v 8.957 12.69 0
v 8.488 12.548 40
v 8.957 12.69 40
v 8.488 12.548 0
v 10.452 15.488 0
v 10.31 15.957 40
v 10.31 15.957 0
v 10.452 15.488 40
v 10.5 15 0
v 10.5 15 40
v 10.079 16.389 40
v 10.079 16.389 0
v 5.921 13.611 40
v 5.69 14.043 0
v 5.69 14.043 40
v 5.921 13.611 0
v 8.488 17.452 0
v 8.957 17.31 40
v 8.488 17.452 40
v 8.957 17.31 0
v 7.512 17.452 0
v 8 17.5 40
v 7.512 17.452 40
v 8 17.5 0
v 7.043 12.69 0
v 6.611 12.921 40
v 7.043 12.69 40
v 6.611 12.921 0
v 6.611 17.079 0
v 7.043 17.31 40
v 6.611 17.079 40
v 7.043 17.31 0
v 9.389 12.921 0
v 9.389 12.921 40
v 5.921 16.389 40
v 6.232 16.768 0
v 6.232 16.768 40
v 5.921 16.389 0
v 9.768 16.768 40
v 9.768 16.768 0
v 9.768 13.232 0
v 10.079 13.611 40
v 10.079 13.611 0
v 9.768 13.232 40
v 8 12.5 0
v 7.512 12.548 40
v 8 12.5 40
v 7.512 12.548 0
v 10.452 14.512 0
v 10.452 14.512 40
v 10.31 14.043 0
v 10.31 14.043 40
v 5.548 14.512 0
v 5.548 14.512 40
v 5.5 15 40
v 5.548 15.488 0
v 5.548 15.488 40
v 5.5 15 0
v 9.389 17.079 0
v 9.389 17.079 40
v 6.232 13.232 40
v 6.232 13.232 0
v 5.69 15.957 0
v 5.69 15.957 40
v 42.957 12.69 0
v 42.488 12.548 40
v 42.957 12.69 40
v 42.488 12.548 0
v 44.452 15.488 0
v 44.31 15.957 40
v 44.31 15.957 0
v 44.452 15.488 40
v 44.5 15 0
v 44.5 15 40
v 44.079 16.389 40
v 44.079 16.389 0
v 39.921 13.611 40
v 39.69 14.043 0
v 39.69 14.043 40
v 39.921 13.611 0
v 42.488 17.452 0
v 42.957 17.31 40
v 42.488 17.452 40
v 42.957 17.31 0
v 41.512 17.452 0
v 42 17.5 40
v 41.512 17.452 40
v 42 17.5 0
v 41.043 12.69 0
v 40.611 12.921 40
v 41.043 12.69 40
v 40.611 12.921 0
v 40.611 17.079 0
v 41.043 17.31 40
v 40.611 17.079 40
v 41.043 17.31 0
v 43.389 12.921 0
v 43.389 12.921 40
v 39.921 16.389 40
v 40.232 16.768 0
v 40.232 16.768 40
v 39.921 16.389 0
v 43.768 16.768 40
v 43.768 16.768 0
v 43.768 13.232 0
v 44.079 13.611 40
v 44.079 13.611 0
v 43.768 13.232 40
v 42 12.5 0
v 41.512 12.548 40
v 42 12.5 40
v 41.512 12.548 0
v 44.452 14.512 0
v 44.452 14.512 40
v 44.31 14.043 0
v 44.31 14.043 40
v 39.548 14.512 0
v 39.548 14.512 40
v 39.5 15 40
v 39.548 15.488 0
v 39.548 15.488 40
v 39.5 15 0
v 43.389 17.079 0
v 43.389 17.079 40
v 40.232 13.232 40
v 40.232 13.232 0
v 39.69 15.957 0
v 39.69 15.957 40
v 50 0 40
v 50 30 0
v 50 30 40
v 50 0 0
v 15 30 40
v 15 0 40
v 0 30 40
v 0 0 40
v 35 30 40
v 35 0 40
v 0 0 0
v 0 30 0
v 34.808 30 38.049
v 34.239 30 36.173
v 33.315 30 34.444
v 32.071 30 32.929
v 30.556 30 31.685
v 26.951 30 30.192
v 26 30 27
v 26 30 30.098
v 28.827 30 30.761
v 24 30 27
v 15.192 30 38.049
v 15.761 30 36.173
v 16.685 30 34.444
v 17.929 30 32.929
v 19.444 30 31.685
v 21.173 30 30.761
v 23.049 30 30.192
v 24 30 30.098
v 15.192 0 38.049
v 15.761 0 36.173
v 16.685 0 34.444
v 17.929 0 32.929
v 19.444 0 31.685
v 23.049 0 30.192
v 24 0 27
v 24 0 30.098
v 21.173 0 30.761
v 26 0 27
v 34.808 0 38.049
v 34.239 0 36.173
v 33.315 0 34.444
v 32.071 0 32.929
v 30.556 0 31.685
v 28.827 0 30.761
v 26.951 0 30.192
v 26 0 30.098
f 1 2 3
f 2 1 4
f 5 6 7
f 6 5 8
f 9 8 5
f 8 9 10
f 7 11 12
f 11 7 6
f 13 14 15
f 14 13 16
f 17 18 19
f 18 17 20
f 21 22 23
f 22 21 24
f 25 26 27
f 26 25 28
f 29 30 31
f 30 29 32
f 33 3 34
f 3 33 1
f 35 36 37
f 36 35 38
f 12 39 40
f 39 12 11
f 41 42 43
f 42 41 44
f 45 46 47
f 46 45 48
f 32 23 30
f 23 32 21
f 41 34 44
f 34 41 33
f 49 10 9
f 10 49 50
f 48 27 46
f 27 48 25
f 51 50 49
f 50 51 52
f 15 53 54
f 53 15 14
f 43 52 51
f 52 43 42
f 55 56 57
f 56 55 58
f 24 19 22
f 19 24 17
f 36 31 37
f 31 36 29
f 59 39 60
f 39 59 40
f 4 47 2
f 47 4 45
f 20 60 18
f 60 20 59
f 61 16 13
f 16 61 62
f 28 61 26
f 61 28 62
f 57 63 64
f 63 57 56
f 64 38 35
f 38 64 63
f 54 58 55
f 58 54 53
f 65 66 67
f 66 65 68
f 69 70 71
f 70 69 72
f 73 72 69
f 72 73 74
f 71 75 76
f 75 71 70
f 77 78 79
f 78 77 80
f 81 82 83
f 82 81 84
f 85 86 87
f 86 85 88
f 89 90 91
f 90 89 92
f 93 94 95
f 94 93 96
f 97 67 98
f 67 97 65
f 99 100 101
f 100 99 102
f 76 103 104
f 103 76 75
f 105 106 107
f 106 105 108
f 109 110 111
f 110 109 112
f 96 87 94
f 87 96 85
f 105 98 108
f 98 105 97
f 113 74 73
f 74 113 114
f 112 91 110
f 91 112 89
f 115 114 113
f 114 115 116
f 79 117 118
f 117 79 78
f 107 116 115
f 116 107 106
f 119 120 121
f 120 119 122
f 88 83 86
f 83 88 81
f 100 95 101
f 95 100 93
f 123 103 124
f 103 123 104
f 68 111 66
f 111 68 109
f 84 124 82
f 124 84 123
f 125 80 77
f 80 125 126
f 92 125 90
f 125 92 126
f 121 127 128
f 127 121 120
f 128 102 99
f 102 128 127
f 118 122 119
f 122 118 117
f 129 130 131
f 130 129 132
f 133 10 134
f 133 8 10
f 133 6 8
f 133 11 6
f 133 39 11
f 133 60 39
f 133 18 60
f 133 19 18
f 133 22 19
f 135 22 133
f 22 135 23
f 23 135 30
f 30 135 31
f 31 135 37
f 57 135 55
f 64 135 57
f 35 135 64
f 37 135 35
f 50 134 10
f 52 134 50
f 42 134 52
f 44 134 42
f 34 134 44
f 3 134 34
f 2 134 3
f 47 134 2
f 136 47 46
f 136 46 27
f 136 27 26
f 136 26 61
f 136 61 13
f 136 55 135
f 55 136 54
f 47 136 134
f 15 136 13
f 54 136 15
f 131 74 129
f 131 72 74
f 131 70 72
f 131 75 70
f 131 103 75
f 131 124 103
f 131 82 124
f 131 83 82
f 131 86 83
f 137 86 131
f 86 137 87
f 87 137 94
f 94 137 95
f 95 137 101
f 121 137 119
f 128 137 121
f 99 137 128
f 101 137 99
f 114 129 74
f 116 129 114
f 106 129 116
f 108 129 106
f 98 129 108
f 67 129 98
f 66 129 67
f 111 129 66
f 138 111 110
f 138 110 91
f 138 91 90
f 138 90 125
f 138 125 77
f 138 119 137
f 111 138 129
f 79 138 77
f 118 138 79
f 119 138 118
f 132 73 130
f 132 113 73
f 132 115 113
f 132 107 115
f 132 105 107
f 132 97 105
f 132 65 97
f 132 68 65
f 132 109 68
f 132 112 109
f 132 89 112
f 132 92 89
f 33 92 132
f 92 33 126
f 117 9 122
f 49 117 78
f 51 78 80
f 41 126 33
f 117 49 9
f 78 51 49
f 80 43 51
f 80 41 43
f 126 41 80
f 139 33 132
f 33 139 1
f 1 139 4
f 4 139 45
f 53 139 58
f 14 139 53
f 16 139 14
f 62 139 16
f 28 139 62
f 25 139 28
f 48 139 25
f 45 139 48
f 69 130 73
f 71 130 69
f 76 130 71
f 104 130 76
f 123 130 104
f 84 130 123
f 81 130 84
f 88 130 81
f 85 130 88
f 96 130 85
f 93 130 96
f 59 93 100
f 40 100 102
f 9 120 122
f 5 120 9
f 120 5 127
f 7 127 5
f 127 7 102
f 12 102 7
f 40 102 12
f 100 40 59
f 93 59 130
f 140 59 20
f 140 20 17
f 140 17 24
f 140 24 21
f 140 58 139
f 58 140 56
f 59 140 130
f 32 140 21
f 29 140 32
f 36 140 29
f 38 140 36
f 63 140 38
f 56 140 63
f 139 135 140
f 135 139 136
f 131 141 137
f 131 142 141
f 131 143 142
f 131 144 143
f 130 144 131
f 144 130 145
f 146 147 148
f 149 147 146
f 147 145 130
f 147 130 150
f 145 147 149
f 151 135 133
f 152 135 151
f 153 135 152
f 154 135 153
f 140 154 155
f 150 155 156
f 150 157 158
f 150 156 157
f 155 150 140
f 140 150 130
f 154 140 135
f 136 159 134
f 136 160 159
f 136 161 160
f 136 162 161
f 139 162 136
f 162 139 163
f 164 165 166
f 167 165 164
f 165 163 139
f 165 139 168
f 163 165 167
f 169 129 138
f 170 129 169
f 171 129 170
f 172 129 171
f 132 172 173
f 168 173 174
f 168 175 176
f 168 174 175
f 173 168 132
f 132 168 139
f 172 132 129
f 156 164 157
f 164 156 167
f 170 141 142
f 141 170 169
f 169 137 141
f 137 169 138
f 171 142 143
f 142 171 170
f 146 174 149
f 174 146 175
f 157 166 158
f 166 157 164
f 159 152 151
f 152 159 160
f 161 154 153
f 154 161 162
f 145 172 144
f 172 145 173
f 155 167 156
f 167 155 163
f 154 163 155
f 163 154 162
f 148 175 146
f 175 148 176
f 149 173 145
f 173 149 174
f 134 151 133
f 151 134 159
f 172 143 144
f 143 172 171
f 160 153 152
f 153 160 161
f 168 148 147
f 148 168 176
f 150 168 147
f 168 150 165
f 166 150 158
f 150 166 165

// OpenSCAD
$fn = 32;

// ----------------------------------------------------------------------
// Saddle clamp: split shaft clamp
// ----------------------------------------------------------------------

// --- parameters (mm) ---
blk_l = 50;               // block length, X
blk_w = 30;               // block width, Y
blk_h = 40;               // block height
clamp_r = 10;             // shaft groove radius
hole_r = 2.5;             // bolt hole radius
hole_m = 8;               // bolt hole margin from the ends
saw_w = 2;                // saw kerf width

saw_depth = clamp_r + 3;  // saw kerf depth

difference() {
  cube([blk_l, blk_w, blk_h]);
  translate([blk_l / 2, -1, blk_h])
    rotate([-90, 0, 0])
      cylinder(h = blk_w + 2, r = clamp_r);
  for (sx = [0, 1])
    translate([sx ? blk_l - hole_m : hole_m, blk_w / 2, -1])
      cylinder(r = hole_r, h = blk_h + 2);
  translate([blk_l / 2 - saw_w / 2, -1, blk_h - saw_depth])
    cube([saw_w, blk_w + 2, saw_depth + 1]);
}
